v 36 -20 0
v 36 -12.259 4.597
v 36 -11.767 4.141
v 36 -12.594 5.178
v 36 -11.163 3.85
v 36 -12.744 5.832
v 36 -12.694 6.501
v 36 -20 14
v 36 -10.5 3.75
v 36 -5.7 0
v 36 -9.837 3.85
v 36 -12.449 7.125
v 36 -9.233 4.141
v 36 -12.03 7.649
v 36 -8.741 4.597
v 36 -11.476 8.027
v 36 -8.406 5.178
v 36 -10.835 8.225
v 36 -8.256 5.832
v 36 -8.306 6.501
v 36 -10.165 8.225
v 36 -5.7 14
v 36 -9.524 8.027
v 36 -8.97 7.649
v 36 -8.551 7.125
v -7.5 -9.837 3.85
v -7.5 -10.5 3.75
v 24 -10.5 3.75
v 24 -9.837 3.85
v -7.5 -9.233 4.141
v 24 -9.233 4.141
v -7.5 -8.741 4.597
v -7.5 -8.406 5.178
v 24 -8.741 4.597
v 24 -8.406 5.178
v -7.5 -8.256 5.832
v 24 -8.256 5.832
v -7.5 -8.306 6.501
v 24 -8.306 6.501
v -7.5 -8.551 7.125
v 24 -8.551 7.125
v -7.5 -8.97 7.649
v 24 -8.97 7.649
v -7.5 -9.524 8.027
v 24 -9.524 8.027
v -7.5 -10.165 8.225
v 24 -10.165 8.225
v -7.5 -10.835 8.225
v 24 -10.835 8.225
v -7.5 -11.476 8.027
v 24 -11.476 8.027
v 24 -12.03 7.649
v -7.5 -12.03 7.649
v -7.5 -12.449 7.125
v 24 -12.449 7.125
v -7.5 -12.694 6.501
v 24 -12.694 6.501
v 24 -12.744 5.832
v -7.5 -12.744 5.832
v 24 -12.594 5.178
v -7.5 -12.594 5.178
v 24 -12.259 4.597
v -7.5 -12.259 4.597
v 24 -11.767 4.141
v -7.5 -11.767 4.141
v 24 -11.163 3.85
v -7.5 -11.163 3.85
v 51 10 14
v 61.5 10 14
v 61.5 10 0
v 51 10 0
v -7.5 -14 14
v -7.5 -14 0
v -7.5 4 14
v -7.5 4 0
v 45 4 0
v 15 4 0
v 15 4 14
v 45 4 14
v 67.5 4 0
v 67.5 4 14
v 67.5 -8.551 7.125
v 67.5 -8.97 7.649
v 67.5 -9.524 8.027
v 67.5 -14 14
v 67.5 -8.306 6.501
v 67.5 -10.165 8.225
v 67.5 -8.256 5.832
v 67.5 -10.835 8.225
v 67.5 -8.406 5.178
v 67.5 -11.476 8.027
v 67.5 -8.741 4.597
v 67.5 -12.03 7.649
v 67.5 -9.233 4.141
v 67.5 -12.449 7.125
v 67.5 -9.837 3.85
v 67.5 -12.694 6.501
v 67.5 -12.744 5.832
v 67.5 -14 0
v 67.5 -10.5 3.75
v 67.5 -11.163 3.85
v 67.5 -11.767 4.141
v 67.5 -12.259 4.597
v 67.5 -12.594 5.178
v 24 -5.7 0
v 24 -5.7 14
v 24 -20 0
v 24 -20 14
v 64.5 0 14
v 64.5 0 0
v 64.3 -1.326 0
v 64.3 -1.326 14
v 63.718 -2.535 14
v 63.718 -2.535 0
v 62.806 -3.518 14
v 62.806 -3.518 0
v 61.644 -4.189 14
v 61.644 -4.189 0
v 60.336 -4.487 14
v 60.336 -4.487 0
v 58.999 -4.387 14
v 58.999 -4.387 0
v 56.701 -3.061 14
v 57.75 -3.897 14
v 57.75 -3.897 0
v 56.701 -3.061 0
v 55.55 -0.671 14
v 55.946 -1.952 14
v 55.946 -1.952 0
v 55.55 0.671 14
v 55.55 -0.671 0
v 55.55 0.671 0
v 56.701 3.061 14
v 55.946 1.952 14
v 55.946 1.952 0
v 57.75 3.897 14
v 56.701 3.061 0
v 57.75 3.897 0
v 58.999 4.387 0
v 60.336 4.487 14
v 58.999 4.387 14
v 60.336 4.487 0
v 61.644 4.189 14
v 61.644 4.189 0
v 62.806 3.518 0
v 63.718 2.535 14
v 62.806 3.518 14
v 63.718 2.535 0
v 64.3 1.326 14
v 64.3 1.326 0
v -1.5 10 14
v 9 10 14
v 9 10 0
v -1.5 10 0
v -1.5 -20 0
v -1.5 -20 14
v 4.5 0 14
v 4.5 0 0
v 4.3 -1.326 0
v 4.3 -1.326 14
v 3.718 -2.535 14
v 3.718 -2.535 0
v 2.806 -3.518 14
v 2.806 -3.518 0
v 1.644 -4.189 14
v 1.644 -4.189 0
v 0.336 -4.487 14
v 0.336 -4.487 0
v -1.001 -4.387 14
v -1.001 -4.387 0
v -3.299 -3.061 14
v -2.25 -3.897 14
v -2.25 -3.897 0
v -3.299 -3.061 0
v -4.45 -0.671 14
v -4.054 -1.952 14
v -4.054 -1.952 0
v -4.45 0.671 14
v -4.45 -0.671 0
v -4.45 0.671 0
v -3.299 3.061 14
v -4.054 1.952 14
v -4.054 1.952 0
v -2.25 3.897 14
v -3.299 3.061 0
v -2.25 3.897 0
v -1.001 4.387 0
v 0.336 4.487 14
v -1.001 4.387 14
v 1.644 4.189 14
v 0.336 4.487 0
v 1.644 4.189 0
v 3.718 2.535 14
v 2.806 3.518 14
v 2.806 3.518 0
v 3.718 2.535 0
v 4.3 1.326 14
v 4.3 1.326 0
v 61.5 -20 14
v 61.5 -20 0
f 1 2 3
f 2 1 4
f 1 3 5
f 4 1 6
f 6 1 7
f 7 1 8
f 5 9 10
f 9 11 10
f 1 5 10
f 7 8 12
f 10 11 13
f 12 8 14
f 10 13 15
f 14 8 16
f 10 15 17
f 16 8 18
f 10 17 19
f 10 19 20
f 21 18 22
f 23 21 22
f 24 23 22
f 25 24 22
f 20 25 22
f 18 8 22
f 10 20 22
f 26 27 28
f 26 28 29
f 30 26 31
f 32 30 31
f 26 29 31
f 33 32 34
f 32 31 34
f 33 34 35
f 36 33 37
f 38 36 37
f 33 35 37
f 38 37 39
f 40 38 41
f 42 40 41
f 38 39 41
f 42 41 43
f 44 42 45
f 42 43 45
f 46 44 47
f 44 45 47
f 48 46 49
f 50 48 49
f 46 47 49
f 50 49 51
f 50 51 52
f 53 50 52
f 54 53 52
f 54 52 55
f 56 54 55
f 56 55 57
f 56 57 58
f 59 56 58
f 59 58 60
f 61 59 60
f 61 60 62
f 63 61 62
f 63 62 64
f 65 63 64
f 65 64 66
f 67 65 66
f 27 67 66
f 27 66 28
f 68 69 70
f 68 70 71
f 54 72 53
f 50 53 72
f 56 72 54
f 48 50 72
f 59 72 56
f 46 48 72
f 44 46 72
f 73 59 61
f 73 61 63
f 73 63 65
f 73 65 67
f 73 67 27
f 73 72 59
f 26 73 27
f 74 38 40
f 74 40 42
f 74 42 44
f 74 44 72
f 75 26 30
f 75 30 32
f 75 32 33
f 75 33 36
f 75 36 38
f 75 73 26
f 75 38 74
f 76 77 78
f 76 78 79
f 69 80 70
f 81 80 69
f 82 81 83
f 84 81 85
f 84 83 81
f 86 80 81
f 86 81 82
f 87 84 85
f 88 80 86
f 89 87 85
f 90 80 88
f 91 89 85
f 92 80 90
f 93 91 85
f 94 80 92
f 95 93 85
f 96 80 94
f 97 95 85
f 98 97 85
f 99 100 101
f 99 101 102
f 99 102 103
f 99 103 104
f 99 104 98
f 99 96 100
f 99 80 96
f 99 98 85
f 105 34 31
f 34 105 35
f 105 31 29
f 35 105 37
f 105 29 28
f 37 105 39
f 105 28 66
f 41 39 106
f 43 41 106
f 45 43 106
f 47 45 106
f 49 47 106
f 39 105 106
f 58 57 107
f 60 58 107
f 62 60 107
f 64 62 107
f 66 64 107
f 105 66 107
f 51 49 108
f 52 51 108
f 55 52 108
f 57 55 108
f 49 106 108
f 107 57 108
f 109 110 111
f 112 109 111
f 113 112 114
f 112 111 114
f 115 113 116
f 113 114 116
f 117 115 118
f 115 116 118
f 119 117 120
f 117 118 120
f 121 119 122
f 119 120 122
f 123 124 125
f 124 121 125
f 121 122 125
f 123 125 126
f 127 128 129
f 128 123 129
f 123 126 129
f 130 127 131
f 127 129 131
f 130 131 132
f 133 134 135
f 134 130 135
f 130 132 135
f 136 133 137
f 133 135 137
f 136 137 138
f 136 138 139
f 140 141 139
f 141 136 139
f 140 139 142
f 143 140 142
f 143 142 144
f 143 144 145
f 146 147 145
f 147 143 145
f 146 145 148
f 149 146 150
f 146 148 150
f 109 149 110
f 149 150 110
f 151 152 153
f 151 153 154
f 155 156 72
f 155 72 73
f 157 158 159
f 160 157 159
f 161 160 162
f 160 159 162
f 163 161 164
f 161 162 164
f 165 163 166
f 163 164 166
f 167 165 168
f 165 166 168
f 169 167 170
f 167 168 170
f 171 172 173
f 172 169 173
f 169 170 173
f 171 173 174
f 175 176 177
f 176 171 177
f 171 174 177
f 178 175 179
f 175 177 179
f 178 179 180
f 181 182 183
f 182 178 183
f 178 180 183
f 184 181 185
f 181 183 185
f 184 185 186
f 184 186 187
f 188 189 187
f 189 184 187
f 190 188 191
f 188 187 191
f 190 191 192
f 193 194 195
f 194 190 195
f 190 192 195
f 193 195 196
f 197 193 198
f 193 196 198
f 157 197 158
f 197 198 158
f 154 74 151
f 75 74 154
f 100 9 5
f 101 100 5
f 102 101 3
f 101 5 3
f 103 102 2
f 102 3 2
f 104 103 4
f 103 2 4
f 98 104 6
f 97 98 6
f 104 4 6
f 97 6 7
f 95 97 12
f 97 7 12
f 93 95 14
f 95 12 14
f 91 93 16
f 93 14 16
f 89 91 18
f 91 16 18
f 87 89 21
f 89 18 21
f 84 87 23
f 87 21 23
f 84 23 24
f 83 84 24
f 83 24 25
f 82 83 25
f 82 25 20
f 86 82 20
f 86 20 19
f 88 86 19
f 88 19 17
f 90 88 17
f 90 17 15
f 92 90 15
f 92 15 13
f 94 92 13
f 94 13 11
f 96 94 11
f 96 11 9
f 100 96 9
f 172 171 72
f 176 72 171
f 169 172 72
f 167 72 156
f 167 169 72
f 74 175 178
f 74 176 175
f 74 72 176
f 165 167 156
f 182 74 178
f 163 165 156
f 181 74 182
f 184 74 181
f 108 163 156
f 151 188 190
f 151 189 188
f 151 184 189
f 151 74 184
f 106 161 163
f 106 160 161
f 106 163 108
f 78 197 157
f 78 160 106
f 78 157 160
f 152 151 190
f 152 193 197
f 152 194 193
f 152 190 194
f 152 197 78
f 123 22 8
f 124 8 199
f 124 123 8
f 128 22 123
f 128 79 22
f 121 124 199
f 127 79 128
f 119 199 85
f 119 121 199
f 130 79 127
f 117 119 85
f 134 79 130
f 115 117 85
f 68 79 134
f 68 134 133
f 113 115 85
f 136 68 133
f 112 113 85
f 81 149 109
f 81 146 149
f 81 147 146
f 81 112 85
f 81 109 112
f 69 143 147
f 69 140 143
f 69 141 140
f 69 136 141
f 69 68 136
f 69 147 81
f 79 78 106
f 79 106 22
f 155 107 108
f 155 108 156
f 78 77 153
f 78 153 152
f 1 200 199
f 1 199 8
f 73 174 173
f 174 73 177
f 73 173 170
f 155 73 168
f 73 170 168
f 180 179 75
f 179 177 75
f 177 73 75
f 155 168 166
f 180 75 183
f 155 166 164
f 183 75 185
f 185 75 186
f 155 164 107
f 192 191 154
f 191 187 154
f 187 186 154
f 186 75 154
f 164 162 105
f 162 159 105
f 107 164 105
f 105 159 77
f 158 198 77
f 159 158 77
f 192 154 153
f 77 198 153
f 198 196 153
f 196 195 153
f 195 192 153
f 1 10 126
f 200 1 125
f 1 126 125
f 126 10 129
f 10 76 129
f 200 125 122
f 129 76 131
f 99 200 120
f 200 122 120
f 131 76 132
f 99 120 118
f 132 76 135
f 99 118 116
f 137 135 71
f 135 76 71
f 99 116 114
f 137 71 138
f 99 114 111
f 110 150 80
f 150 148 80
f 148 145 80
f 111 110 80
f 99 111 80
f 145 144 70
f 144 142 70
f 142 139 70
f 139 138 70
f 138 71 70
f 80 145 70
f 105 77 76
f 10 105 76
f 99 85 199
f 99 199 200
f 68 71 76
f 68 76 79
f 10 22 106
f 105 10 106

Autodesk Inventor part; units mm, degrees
ref_plane "YZ Plane" through (0, 0, 0) normal (1, 0, 0) x (0, 1, 0)
ref_plane "XZ Plane" through (0, 0, 0) normal (0, 1, 0) x (-1, 0, 0)
ref_plane "XY Plane" through (0, 0, 0) normal (0, 0, 1) x (1, 0, 0)
sketch "Sketch1" plane through (0, 0, 0) normal (0, 0, 1) x (1, 0, 0)
  line L0 (0, 0) -> (60, 0) construction
  circle A0 centre (0, 0) radius 4.5
  circle A1 centre (60, 0) radius 4.5
  line L1 (67.5, -20) -> (-7.5, -20)
  line L2 (-7.5, -20) -> (-7.5, 20)
  line L3 (-7.5, 20) -> (67.5, 20)
  line L4 (67.5, 20) -> (67.5, -20)
  line L5 (67.5, -20) -> (-7.5, 20) construction
  line L6 (-7.5, -20) -> (67.5, 20) construction
  point P0 (30, 0)
  dimension "d0" = 9
  dimension "d1" = 60
  dimension "d2" = 40
  dimension "d3" = 75
extrude "Extrusion1" add sketch "Sketch1" along normal blind 14
sketch "Sketch2" plane through (0, 0, 14) normal (0, 0, 1) x (1, 0, 0)
  line L0 (-7.5, -20) -> (67.5, -20) projected
  line L1 (24, -20) -> (36, -20)
  line L2 (36, -20) -> (36, -5.7)
  line L3 (36, -5.7) -> (24, -5.7)
  line L4 (24, -5.7) -> (24, -20)
  point P0 (30, -20)
  dimension "d6" = 12
  dimension "d7" = 14.3
extrude "Extrusion2" cut sketch "Sketch2" against normal through all
sketch "Sketch3" plane through (24, -20, 14) normal (1, 0, 0) x (0, 0, -1)
  line L0 (0, 0) -> (8, 0) construction
  line L1 (8, 0) -> (8, 9.5) construction
  line L2 (8, 9.5) -> (0, 9.5) construction
  line L3 (0, 9.5) -> (0, 0) construction
  circle A0 centre (8, 9.5) radius 2.25
  point P0 (14, 20)
  dimension "d10" = 8
  dimension "d11" = 9.5
  dimension "d12" = 4.5
extrude "Extrusion3" cut sketch "Sketch3" along normal through all both and the other way through all
sketch "Sketch4" plane through (0, 0, 14) normal (0, 0, 1) x (1, 0, 0)
  line L0 (67.5, -20) -> (67.5, 20) projected
  circle A0 centre (0, 0) radius 4.5 projected
  line L1 (-7.5, 20) -> (67.5, 20)
  line L2 (67.5, 20) -> (67.5, 10)
  line L3 (67.5, 10) -> (-7.5, 10)
  line L4 (-7.5, 10) -> (-7.5, 20)
  dimension "d15" = 10
extrude "Extrusion4" cut sketch "Sketch4" against normal through all contours L3 L4 L1 L0
sketch "Sketch5" plane through (0, 0, 0) normal (0, 0, -1) x (-1, 0, 0)
  line L0 (7.5, 10) -> (-67.5, 10) projected
  line L1 (-45, 10) -> (-15, 10)
  line L2 (-15, 10) -> (-15, 4)
  line L3 (-15, 4) -> (-45, 4)
  line L4 (-45, 4) -> (-45, 10)
  point P0 (-30, 10)
  dimension "d18" = 30
  dimension "d19" = 6
extrude "Extrusion5" cut sketch "Sketch5" against normal through all
chamfer "Chamfer1" distance 6 angle 45 2 edges at (45, 10, 7) (15, 10, 7)
chamfer "Chamfer2" distance 6 angle 45 4 edges at (-7.5, 10, 7) (67.5, 10, 7) (-7.5, -20, 7) (67.5, -20, 7)
properties part number "sensor bracket"
